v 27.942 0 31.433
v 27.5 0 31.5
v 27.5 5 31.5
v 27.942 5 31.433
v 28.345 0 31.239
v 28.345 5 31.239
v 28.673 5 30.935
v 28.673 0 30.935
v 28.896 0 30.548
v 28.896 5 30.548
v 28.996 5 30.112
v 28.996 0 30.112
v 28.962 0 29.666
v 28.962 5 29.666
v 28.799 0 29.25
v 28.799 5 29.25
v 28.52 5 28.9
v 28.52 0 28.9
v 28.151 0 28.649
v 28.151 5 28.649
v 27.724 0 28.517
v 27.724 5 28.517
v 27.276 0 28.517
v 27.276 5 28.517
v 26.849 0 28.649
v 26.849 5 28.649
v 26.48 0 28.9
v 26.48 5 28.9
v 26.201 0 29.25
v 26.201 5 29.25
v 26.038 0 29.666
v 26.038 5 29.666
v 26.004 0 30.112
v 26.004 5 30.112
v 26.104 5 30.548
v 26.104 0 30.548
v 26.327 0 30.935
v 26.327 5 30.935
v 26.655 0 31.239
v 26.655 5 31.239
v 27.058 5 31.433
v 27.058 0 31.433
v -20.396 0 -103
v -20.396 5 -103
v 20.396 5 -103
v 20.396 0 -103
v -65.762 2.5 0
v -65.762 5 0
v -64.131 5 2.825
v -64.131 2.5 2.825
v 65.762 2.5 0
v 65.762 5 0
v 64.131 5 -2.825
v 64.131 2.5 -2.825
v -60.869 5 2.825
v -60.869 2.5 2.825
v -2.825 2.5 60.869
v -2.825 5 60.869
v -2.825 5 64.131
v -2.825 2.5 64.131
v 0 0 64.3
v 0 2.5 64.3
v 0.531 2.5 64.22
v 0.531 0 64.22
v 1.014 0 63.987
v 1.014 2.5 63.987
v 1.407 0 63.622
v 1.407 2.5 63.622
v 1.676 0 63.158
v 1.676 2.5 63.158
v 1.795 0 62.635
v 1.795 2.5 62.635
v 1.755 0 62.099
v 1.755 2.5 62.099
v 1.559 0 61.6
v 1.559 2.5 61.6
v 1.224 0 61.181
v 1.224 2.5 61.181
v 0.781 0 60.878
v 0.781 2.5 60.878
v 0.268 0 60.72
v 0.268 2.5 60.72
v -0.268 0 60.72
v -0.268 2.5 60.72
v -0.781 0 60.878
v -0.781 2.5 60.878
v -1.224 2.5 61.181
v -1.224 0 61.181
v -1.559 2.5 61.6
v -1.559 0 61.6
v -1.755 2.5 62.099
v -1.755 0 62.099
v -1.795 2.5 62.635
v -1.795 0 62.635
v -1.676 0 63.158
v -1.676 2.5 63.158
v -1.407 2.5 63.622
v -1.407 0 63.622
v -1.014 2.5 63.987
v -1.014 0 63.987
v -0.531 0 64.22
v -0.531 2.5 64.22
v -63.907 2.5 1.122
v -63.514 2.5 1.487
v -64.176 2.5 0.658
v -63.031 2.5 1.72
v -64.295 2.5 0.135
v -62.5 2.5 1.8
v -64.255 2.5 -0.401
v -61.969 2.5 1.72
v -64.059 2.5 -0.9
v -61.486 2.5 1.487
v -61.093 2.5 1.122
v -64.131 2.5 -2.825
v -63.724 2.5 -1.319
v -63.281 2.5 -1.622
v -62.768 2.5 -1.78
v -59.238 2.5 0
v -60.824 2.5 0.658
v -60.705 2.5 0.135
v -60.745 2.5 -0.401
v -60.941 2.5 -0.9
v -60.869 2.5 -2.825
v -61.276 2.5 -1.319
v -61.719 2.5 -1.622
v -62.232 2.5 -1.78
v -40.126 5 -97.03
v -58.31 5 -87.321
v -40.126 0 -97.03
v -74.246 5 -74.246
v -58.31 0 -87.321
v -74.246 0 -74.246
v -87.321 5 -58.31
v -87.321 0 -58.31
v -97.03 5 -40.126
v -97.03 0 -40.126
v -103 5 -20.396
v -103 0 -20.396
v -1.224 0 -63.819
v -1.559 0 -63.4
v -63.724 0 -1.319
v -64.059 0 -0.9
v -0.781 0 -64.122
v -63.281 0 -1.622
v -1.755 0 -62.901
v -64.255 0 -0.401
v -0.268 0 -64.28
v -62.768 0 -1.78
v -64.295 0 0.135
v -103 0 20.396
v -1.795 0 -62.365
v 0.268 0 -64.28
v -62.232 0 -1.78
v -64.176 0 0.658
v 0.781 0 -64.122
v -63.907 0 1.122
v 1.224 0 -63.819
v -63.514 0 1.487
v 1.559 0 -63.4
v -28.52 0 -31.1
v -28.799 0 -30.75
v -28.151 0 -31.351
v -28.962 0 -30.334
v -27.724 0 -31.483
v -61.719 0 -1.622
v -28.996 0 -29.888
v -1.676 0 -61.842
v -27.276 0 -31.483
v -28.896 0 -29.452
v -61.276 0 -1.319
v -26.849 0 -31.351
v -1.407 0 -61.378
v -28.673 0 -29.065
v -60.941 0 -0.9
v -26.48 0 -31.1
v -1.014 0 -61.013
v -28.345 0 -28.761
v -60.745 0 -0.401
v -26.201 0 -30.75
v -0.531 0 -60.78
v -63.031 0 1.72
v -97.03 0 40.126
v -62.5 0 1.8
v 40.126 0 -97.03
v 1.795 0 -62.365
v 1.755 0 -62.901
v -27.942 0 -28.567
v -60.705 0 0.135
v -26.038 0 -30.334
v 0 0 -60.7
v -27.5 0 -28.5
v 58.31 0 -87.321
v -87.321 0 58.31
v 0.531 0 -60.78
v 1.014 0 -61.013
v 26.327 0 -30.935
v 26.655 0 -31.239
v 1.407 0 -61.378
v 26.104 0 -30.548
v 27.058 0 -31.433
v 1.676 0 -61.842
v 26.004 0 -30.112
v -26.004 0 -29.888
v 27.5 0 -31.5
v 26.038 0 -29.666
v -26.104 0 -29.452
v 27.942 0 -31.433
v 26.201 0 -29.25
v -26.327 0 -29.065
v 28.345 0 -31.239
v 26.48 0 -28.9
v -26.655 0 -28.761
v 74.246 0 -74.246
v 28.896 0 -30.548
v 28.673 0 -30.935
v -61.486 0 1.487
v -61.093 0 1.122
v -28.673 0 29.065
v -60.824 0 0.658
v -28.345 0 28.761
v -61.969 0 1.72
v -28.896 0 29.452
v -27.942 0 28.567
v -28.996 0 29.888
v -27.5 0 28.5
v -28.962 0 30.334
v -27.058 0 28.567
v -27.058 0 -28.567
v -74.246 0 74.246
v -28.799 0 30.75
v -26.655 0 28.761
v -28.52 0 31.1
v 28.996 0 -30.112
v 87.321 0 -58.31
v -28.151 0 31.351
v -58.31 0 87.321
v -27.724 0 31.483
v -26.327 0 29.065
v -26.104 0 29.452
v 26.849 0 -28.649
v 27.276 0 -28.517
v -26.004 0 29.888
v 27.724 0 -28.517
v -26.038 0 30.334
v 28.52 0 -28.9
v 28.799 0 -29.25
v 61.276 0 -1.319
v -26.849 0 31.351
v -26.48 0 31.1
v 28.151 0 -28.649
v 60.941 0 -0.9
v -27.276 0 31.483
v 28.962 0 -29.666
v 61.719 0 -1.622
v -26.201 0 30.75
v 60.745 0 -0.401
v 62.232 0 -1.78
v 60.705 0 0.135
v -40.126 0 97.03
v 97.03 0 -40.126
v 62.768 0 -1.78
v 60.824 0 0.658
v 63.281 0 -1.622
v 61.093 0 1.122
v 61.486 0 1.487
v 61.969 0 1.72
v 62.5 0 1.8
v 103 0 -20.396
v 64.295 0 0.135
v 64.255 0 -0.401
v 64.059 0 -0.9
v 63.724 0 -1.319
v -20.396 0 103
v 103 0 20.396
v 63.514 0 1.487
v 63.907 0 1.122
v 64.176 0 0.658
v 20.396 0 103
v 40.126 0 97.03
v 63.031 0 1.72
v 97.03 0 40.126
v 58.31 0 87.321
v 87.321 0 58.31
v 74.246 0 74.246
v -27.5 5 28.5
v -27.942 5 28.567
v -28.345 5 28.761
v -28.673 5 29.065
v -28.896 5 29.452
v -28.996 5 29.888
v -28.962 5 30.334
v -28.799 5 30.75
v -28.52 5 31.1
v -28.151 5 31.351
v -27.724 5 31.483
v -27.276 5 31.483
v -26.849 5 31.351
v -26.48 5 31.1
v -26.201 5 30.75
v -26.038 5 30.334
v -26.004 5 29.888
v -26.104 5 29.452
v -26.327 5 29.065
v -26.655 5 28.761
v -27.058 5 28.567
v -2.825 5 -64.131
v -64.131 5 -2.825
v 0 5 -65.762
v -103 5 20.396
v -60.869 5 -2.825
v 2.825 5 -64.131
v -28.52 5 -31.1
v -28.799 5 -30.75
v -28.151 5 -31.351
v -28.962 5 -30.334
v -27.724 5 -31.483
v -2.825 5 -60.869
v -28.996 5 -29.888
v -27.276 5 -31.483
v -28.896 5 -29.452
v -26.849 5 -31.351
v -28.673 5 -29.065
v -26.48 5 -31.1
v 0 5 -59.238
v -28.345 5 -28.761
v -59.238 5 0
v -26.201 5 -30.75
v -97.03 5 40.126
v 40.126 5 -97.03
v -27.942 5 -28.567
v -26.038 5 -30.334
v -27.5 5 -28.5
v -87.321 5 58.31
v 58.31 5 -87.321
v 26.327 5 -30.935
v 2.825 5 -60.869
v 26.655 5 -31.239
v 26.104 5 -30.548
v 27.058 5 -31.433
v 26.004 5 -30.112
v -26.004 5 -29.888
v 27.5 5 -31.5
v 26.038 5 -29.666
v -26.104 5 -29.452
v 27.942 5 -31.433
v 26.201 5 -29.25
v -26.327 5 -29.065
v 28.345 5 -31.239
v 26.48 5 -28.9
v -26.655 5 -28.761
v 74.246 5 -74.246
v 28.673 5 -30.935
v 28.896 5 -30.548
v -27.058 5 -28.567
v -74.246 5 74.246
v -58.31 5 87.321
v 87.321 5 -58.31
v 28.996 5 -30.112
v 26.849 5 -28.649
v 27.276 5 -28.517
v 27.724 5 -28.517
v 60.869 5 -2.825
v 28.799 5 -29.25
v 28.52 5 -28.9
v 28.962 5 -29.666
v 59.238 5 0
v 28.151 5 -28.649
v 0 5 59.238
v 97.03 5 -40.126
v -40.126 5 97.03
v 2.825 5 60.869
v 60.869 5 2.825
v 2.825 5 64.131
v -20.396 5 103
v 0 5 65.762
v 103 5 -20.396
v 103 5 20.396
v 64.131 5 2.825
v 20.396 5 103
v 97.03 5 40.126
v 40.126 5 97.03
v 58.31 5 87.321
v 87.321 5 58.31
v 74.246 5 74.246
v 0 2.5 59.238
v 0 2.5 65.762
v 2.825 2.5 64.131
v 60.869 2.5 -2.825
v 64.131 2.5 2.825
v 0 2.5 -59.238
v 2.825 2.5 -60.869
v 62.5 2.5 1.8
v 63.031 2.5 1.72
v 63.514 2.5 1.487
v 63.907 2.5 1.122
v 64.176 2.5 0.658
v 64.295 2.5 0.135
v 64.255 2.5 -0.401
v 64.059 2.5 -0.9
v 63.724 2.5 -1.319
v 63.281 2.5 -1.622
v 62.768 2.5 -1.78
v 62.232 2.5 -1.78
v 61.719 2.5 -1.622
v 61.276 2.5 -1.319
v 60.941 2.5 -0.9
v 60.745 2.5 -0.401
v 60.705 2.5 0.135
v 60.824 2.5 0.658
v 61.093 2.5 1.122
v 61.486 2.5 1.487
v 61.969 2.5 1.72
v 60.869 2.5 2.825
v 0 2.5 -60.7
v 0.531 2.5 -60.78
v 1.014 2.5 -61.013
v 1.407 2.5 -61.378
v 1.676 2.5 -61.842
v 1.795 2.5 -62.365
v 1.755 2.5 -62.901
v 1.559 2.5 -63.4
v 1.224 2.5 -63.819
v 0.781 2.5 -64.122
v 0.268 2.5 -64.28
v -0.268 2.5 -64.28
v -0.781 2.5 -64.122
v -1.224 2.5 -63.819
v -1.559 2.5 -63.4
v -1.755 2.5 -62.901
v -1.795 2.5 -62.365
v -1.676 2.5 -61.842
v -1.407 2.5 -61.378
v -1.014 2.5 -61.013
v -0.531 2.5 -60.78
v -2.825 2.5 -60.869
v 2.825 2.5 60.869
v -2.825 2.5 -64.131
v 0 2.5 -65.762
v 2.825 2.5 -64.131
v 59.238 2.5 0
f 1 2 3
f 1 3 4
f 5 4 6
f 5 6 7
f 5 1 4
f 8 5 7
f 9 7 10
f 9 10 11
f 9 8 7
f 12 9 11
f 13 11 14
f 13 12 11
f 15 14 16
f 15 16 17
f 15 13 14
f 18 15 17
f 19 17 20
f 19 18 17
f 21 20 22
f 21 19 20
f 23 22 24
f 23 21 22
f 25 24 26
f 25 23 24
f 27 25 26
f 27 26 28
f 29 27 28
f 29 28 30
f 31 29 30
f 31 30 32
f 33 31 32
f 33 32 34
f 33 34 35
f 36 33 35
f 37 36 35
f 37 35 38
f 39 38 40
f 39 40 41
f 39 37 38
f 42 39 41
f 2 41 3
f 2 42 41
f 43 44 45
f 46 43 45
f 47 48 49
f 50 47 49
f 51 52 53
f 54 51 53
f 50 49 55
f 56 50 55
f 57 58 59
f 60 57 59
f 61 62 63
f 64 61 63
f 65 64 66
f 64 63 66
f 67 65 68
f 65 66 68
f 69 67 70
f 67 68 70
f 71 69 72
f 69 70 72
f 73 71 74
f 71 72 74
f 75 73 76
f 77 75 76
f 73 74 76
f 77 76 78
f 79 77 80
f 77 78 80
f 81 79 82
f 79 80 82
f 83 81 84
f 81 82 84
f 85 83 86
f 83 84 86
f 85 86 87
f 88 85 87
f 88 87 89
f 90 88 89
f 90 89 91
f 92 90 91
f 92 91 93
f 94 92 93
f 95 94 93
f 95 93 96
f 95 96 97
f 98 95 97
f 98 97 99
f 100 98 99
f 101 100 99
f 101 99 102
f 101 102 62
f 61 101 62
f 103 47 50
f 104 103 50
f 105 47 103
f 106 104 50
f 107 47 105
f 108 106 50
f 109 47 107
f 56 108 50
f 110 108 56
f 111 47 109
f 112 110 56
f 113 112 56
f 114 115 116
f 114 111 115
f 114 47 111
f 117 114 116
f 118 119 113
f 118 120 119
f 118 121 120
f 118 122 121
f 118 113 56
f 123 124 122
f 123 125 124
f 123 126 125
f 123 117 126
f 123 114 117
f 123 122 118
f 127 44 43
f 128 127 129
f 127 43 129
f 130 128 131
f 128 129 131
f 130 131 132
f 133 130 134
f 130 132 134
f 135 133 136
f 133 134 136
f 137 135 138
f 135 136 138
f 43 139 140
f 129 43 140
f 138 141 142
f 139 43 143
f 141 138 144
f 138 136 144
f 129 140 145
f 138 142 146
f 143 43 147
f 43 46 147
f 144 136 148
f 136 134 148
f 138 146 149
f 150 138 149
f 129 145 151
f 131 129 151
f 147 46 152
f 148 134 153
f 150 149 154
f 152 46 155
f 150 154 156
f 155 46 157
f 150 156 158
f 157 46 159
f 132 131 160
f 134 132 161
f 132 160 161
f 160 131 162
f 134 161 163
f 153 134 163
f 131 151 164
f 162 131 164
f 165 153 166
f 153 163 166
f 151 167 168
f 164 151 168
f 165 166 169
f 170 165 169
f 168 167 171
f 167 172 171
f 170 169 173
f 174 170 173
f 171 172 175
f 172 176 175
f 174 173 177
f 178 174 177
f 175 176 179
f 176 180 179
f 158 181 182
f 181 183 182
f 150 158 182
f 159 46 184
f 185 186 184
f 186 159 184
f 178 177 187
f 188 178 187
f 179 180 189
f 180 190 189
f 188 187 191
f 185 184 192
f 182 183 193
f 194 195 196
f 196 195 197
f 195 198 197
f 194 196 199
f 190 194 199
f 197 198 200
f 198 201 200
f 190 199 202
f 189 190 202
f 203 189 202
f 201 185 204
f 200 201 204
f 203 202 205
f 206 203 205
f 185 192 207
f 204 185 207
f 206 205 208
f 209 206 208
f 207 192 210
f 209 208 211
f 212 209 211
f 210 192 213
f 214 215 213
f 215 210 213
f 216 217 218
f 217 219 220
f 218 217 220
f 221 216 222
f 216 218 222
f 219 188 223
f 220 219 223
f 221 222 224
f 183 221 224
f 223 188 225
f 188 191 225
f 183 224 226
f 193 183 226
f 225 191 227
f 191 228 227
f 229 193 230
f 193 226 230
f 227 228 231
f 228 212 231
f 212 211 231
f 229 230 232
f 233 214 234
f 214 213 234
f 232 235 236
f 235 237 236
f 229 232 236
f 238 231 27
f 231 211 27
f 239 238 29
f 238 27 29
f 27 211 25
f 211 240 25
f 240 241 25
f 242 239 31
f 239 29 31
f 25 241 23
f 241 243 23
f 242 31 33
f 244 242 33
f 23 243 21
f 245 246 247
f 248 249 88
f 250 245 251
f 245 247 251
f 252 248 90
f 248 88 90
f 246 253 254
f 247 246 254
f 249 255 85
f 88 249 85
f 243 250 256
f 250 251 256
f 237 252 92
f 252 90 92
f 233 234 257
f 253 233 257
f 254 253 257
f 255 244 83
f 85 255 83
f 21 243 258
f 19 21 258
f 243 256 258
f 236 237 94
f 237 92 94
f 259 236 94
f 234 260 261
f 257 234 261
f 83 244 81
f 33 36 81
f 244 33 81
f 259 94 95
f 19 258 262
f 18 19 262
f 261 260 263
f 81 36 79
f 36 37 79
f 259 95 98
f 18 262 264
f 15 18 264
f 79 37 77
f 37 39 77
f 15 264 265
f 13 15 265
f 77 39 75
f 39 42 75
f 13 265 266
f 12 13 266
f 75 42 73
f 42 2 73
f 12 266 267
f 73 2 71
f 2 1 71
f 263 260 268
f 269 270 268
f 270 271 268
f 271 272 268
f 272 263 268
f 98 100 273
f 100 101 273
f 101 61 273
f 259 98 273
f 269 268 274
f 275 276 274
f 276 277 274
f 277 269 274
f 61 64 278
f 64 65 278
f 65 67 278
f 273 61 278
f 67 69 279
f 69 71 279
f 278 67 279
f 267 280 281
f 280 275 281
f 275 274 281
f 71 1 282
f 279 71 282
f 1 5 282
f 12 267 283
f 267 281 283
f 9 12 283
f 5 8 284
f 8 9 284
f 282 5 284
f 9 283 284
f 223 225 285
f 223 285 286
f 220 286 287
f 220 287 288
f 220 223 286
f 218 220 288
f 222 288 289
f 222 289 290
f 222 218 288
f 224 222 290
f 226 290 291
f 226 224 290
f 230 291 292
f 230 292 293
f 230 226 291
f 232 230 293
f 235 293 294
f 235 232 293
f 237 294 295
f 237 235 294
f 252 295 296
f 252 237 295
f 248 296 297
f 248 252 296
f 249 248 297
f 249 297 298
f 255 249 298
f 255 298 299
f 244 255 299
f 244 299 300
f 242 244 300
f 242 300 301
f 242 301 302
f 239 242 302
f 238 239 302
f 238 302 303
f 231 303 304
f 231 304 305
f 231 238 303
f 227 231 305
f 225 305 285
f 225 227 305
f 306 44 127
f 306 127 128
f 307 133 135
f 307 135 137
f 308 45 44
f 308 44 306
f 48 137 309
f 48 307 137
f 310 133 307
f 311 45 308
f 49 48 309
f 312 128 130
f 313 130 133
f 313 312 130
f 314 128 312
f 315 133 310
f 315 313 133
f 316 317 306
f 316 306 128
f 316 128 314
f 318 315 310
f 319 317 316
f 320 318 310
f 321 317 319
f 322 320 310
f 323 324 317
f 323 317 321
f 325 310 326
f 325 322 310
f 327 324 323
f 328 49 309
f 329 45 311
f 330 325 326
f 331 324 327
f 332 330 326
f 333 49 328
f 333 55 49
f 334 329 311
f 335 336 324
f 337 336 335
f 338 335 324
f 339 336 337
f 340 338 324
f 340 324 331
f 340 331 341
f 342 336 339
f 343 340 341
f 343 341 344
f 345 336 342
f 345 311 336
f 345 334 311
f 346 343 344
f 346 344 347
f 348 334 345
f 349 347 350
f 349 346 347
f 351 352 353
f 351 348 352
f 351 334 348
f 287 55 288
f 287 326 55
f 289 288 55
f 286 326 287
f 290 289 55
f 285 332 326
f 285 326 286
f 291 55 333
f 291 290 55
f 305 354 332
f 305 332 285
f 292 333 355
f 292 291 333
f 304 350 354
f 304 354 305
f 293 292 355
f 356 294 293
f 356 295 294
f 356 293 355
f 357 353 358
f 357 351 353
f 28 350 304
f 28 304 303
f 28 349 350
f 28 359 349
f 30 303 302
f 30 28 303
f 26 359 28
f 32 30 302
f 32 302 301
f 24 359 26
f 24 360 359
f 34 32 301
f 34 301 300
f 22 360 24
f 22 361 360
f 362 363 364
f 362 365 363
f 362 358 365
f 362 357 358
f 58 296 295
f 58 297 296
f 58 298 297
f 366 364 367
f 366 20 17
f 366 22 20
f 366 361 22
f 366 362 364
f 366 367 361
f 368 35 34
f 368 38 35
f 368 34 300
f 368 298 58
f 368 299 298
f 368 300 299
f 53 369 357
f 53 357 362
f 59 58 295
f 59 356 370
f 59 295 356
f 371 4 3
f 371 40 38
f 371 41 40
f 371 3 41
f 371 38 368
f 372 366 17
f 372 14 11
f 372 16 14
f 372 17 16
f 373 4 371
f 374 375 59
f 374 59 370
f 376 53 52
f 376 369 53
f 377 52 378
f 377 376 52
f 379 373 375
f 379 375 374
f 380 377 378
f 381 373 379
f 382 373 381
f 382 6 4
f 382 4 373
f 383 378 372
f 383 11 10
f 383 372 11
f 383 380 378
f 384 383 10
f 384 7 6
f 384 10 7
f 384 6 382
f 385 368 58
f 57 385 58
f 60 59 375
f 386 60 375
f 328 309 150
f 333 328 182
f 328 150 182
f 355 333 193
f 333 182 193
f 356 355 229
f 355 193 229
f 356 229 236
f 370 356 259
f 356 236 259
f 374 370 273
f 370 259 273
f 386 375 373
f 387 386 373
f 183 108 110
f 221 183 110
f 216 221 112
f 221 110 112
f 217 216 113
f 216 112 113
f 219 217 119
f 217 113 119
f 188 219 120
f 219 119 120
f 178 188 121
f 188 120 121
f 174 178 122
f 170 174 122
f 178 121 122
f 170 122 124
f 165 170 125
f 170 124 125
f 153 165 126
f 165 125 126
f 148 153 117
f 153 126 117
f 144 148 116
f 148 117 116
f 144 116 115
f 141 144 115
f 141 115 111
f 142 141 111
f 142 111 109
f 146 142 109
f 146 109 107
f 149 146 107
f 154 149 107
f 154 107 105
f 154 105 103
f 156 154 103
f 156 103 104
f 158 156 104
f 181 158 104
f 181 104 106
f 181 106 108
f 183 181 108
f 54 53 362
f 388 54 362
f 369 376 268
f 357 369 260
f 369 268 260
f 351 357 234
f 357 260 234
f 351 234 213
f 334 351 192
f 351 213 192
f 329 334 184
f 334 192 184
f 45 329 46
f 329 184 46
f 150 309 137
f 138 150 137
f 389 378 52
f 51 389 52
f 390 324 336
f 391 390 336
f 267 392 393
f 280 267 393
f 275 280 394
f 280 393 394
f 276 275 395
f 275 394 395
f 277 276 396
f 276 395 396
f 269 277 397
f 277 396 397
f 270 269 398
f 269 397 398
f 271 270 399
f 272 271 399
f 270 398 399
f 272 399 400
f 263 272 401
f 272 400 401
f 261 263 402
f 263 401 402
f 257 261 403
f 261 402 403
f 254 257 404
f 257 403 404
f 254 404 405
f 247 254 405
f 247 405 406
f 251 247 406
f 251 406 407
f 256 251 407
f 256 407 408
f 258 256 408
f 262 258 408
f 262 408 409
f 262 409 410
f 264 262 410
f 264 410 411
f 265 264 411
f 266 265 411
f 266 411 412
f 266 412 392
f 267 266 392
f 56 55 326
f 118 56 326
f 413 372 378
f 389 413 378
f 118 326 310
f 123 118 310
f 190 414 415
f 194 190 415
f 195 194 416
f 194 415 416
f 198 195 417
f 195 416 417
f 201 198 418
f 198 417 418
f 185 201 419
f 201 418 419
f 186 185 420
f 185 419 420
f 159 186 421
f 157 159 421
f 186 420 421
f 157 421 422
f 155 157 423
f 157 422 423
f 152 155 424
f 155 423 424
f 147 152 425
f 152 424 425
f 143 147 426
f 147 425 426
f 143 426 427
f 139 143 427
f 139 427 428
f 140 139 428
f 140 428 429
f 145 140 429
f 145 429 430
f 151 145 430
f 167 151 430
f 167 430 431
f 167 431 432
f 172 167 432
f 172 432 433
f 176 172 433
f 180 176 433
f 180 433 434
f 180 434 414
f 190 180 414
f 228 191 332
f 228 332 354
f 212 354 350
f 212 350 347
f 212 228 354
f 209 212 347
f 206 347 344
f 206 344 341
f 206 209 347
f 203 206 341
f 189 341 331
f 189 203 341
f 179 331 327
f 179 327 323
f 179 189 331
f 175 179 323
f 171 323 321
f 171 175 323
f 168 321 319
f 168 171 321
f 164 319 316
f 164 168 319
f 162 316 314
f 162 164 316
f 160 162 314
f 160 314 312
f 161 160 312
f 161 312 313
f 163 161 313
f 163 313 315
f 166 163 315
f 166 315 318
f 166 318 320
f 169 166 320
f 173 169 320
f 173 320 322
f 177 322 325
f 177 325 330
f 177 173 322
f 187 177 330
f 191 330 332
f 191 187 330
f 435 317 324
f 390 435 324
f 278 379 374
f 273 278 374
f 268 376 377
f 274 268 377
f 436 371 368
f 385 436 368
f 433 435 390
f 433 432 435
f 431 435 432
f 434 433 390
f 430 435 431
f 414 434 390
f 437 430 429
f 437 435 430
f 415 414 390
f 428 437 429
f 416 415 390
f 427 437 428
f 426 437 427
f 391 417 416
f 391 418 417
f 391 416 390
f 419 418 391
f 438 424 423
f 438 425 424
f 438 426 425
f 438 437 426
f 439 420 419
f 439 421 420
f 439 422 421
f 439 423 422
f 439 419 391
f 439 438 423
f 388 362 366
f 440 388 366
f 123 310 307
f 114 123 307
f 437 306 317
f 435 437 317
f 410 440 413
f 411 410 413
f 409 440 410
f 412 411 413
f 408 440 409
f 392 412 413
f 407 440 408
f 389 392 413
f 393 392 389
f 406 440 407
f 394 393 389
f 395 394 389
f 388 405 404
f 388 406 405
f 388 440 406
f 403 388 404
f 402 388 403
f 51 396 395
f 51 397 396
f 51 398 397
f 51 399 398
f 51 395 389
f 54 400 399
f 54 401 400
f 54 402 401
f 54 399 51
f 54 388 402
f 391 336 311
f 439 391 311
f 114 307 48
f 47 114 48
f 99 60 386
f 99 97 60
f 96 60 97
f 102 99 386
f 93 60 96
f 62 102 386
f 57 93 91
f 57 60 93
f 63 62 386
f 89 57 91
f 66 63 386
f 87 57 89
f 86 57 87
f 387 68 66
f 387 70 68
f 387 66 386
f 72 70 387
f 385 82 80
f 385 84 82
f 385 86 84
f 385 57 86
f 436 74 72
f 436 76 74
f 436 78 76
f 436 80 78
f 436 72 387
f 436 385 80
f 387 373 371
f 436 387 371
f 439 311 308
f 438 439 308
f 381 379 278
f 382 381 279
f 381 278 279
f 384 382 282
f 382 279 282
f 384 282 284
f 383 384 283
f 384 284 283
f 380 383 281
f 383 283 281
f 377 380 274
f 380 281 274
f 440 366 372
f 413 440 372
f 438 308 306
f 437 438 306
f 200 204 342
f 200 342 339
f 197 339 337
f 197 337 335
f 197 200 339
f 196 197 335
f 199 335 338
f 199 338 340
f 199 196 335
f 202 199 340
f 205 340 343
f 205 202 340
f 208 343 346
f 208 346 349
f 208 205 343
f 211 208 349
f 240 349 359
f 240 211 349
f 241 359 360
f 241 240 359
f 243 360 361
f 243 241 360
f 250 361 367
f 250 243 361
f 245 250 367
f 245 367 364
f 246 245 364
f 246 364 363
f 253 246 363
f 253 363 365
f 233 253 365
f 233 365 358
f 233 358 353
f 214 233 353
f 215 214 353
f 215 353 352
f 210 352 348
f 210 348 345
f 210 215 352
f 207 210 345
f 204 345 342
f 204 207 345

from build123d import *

# Parameters (mm, degrees)
SKETCH1_R           = 105
SKETCH1_R_2         = 1.5
BOSS_EXTRUDE1_DEPTH = 5
CUT_EXTRUDE1_DEPTH  = 2.5
SKETCH2_3_R         = 1.8
CUT_EXTRUDE3_DEPTH  = 149.576579581
CUT_EXTRUDE4_DEPTH  = 149.576579581


with BuildPart() as part:
    # Sketch1 → Boss-Extrude1 (new body)
    with BuildSketch(Plane(origin=(0, 0, 0), x_dir=(1, 0, 0), z_dir=(0, 1, 0))):
        Circle(SKETCH1_R)
        with Locations((-27.5, 30)):
            Circle(SKETCH1_R_2, mode=Mode.SUBTRACT)
        with Locations((27.5, 30)):
            Circle(SKETCH1_R_2, mode=Mode.SUBTRACT)
        with Locations((27.5, -30)):
            Circle(SKETCH1_R_2, mode=Mode.SUBTRACT)
        with Locations((-27.5, -30)):
            Circle(SKETCH1_R_2, mode=Mode.SUBTRACT)
    extrude(amount=BOSS_EXTRUDE1_DEPTH)

    # Sketch2 → Cut-Extrude1 (cut)
    with BuildSketch(Plane(origin=(0, 5, 0), x_dir=(1, 0, 0), z_dir=(0, 1, 0))):
        Polygon((-2.825, 64.13101451), (-2.825, 60.86898549), (0, 59.237970979), (2.825, 60.86898549), (2.825, 64.13101451), (0, 65.762029021), align=None)
        Polygon((-64.13101451, -2.825), (-60.86898549, -2.825), (-59.237970979, 0), (-60.86898549, 2.825), (-64.13101451, 2.825), (-65.762029021, 0), align=None)
        Polygon((64.13101451, 2.825), (60.86898549, 2.825), (59.237970979, 0), (60.86898549, -2.825), (64.13101451, -2.825), (65.762029021, 0), align=None)
        Polygon((2.825, -64.13101451), (2.825, -60.86898549), (0, -59.237970979), (-2.825, -60.86898549), (-2.825, -64.13101451), (0, -65.762029021), align=None)
    extrude(amount=-CUT_EXTRUDE1_DEPTH, mode=Mode.SUBTRACT)

    # Sketch2<3> → Cut-Extrude3 (cut, through all)
    with BuildSketch(Plane(origin=(0, 5, 0), x_dir=(1, 0, 0), z_dir=(0, 1, 0))):
        with Locations((-62.5, 0)):
            Circle(SKETCH2_3_R)
        with Locations((0, 62.5)):
            Circle(SKETCH2_3_R)
        with Locations((62.5, 0)):
            Circle(SKETCH2_3_R)
        with Locations((0, -62.5)):
            Circle(SKETCH2_3_R)
    extrude(amount=-CUT_EXTRUDE3_DEPTH, mode=Mode.SUBTRACT)

    # Sketch4 → Cut-Extrude4 (cut, through all)
    with BuildSketch(Plane(origin=(0, 5, 0), x_dir=(1, 0, 0), z_dir=(0, 1, 0))):
        with BuildLine():
            ThreePointArc((20.396078054, 103), (0, 105), (-20.396078054, 103))
            Line((-20.396078054, 103), (20.396078054, 103))
        make_face()
        with BuildLine():
            Line((-103, -20.396078054), (-103, 20.396078054))
            ThreePointArc((-103, 20.396078054), (-105, 0), (-103, -20.396078054))
        make_face()
        with BuildLine():
            ThreePointArc((103, -20.396078054), (105, 0), (103, 20.396078054))
            Line((103, 20.396078054), (103, -20.396078054))
        make_face()
        with BuildLine():
            Line((20.396078054, -103), (-20.396078054, -103))
            ThreePointArc((-20.396078054, -103), (0, -105), (20.396078054, -103))
        make_face()
    extrude(amount=-CUT_EXTRUDE4_DEPTH, mode=Mode.SUBTRACT)


solid = part.part
